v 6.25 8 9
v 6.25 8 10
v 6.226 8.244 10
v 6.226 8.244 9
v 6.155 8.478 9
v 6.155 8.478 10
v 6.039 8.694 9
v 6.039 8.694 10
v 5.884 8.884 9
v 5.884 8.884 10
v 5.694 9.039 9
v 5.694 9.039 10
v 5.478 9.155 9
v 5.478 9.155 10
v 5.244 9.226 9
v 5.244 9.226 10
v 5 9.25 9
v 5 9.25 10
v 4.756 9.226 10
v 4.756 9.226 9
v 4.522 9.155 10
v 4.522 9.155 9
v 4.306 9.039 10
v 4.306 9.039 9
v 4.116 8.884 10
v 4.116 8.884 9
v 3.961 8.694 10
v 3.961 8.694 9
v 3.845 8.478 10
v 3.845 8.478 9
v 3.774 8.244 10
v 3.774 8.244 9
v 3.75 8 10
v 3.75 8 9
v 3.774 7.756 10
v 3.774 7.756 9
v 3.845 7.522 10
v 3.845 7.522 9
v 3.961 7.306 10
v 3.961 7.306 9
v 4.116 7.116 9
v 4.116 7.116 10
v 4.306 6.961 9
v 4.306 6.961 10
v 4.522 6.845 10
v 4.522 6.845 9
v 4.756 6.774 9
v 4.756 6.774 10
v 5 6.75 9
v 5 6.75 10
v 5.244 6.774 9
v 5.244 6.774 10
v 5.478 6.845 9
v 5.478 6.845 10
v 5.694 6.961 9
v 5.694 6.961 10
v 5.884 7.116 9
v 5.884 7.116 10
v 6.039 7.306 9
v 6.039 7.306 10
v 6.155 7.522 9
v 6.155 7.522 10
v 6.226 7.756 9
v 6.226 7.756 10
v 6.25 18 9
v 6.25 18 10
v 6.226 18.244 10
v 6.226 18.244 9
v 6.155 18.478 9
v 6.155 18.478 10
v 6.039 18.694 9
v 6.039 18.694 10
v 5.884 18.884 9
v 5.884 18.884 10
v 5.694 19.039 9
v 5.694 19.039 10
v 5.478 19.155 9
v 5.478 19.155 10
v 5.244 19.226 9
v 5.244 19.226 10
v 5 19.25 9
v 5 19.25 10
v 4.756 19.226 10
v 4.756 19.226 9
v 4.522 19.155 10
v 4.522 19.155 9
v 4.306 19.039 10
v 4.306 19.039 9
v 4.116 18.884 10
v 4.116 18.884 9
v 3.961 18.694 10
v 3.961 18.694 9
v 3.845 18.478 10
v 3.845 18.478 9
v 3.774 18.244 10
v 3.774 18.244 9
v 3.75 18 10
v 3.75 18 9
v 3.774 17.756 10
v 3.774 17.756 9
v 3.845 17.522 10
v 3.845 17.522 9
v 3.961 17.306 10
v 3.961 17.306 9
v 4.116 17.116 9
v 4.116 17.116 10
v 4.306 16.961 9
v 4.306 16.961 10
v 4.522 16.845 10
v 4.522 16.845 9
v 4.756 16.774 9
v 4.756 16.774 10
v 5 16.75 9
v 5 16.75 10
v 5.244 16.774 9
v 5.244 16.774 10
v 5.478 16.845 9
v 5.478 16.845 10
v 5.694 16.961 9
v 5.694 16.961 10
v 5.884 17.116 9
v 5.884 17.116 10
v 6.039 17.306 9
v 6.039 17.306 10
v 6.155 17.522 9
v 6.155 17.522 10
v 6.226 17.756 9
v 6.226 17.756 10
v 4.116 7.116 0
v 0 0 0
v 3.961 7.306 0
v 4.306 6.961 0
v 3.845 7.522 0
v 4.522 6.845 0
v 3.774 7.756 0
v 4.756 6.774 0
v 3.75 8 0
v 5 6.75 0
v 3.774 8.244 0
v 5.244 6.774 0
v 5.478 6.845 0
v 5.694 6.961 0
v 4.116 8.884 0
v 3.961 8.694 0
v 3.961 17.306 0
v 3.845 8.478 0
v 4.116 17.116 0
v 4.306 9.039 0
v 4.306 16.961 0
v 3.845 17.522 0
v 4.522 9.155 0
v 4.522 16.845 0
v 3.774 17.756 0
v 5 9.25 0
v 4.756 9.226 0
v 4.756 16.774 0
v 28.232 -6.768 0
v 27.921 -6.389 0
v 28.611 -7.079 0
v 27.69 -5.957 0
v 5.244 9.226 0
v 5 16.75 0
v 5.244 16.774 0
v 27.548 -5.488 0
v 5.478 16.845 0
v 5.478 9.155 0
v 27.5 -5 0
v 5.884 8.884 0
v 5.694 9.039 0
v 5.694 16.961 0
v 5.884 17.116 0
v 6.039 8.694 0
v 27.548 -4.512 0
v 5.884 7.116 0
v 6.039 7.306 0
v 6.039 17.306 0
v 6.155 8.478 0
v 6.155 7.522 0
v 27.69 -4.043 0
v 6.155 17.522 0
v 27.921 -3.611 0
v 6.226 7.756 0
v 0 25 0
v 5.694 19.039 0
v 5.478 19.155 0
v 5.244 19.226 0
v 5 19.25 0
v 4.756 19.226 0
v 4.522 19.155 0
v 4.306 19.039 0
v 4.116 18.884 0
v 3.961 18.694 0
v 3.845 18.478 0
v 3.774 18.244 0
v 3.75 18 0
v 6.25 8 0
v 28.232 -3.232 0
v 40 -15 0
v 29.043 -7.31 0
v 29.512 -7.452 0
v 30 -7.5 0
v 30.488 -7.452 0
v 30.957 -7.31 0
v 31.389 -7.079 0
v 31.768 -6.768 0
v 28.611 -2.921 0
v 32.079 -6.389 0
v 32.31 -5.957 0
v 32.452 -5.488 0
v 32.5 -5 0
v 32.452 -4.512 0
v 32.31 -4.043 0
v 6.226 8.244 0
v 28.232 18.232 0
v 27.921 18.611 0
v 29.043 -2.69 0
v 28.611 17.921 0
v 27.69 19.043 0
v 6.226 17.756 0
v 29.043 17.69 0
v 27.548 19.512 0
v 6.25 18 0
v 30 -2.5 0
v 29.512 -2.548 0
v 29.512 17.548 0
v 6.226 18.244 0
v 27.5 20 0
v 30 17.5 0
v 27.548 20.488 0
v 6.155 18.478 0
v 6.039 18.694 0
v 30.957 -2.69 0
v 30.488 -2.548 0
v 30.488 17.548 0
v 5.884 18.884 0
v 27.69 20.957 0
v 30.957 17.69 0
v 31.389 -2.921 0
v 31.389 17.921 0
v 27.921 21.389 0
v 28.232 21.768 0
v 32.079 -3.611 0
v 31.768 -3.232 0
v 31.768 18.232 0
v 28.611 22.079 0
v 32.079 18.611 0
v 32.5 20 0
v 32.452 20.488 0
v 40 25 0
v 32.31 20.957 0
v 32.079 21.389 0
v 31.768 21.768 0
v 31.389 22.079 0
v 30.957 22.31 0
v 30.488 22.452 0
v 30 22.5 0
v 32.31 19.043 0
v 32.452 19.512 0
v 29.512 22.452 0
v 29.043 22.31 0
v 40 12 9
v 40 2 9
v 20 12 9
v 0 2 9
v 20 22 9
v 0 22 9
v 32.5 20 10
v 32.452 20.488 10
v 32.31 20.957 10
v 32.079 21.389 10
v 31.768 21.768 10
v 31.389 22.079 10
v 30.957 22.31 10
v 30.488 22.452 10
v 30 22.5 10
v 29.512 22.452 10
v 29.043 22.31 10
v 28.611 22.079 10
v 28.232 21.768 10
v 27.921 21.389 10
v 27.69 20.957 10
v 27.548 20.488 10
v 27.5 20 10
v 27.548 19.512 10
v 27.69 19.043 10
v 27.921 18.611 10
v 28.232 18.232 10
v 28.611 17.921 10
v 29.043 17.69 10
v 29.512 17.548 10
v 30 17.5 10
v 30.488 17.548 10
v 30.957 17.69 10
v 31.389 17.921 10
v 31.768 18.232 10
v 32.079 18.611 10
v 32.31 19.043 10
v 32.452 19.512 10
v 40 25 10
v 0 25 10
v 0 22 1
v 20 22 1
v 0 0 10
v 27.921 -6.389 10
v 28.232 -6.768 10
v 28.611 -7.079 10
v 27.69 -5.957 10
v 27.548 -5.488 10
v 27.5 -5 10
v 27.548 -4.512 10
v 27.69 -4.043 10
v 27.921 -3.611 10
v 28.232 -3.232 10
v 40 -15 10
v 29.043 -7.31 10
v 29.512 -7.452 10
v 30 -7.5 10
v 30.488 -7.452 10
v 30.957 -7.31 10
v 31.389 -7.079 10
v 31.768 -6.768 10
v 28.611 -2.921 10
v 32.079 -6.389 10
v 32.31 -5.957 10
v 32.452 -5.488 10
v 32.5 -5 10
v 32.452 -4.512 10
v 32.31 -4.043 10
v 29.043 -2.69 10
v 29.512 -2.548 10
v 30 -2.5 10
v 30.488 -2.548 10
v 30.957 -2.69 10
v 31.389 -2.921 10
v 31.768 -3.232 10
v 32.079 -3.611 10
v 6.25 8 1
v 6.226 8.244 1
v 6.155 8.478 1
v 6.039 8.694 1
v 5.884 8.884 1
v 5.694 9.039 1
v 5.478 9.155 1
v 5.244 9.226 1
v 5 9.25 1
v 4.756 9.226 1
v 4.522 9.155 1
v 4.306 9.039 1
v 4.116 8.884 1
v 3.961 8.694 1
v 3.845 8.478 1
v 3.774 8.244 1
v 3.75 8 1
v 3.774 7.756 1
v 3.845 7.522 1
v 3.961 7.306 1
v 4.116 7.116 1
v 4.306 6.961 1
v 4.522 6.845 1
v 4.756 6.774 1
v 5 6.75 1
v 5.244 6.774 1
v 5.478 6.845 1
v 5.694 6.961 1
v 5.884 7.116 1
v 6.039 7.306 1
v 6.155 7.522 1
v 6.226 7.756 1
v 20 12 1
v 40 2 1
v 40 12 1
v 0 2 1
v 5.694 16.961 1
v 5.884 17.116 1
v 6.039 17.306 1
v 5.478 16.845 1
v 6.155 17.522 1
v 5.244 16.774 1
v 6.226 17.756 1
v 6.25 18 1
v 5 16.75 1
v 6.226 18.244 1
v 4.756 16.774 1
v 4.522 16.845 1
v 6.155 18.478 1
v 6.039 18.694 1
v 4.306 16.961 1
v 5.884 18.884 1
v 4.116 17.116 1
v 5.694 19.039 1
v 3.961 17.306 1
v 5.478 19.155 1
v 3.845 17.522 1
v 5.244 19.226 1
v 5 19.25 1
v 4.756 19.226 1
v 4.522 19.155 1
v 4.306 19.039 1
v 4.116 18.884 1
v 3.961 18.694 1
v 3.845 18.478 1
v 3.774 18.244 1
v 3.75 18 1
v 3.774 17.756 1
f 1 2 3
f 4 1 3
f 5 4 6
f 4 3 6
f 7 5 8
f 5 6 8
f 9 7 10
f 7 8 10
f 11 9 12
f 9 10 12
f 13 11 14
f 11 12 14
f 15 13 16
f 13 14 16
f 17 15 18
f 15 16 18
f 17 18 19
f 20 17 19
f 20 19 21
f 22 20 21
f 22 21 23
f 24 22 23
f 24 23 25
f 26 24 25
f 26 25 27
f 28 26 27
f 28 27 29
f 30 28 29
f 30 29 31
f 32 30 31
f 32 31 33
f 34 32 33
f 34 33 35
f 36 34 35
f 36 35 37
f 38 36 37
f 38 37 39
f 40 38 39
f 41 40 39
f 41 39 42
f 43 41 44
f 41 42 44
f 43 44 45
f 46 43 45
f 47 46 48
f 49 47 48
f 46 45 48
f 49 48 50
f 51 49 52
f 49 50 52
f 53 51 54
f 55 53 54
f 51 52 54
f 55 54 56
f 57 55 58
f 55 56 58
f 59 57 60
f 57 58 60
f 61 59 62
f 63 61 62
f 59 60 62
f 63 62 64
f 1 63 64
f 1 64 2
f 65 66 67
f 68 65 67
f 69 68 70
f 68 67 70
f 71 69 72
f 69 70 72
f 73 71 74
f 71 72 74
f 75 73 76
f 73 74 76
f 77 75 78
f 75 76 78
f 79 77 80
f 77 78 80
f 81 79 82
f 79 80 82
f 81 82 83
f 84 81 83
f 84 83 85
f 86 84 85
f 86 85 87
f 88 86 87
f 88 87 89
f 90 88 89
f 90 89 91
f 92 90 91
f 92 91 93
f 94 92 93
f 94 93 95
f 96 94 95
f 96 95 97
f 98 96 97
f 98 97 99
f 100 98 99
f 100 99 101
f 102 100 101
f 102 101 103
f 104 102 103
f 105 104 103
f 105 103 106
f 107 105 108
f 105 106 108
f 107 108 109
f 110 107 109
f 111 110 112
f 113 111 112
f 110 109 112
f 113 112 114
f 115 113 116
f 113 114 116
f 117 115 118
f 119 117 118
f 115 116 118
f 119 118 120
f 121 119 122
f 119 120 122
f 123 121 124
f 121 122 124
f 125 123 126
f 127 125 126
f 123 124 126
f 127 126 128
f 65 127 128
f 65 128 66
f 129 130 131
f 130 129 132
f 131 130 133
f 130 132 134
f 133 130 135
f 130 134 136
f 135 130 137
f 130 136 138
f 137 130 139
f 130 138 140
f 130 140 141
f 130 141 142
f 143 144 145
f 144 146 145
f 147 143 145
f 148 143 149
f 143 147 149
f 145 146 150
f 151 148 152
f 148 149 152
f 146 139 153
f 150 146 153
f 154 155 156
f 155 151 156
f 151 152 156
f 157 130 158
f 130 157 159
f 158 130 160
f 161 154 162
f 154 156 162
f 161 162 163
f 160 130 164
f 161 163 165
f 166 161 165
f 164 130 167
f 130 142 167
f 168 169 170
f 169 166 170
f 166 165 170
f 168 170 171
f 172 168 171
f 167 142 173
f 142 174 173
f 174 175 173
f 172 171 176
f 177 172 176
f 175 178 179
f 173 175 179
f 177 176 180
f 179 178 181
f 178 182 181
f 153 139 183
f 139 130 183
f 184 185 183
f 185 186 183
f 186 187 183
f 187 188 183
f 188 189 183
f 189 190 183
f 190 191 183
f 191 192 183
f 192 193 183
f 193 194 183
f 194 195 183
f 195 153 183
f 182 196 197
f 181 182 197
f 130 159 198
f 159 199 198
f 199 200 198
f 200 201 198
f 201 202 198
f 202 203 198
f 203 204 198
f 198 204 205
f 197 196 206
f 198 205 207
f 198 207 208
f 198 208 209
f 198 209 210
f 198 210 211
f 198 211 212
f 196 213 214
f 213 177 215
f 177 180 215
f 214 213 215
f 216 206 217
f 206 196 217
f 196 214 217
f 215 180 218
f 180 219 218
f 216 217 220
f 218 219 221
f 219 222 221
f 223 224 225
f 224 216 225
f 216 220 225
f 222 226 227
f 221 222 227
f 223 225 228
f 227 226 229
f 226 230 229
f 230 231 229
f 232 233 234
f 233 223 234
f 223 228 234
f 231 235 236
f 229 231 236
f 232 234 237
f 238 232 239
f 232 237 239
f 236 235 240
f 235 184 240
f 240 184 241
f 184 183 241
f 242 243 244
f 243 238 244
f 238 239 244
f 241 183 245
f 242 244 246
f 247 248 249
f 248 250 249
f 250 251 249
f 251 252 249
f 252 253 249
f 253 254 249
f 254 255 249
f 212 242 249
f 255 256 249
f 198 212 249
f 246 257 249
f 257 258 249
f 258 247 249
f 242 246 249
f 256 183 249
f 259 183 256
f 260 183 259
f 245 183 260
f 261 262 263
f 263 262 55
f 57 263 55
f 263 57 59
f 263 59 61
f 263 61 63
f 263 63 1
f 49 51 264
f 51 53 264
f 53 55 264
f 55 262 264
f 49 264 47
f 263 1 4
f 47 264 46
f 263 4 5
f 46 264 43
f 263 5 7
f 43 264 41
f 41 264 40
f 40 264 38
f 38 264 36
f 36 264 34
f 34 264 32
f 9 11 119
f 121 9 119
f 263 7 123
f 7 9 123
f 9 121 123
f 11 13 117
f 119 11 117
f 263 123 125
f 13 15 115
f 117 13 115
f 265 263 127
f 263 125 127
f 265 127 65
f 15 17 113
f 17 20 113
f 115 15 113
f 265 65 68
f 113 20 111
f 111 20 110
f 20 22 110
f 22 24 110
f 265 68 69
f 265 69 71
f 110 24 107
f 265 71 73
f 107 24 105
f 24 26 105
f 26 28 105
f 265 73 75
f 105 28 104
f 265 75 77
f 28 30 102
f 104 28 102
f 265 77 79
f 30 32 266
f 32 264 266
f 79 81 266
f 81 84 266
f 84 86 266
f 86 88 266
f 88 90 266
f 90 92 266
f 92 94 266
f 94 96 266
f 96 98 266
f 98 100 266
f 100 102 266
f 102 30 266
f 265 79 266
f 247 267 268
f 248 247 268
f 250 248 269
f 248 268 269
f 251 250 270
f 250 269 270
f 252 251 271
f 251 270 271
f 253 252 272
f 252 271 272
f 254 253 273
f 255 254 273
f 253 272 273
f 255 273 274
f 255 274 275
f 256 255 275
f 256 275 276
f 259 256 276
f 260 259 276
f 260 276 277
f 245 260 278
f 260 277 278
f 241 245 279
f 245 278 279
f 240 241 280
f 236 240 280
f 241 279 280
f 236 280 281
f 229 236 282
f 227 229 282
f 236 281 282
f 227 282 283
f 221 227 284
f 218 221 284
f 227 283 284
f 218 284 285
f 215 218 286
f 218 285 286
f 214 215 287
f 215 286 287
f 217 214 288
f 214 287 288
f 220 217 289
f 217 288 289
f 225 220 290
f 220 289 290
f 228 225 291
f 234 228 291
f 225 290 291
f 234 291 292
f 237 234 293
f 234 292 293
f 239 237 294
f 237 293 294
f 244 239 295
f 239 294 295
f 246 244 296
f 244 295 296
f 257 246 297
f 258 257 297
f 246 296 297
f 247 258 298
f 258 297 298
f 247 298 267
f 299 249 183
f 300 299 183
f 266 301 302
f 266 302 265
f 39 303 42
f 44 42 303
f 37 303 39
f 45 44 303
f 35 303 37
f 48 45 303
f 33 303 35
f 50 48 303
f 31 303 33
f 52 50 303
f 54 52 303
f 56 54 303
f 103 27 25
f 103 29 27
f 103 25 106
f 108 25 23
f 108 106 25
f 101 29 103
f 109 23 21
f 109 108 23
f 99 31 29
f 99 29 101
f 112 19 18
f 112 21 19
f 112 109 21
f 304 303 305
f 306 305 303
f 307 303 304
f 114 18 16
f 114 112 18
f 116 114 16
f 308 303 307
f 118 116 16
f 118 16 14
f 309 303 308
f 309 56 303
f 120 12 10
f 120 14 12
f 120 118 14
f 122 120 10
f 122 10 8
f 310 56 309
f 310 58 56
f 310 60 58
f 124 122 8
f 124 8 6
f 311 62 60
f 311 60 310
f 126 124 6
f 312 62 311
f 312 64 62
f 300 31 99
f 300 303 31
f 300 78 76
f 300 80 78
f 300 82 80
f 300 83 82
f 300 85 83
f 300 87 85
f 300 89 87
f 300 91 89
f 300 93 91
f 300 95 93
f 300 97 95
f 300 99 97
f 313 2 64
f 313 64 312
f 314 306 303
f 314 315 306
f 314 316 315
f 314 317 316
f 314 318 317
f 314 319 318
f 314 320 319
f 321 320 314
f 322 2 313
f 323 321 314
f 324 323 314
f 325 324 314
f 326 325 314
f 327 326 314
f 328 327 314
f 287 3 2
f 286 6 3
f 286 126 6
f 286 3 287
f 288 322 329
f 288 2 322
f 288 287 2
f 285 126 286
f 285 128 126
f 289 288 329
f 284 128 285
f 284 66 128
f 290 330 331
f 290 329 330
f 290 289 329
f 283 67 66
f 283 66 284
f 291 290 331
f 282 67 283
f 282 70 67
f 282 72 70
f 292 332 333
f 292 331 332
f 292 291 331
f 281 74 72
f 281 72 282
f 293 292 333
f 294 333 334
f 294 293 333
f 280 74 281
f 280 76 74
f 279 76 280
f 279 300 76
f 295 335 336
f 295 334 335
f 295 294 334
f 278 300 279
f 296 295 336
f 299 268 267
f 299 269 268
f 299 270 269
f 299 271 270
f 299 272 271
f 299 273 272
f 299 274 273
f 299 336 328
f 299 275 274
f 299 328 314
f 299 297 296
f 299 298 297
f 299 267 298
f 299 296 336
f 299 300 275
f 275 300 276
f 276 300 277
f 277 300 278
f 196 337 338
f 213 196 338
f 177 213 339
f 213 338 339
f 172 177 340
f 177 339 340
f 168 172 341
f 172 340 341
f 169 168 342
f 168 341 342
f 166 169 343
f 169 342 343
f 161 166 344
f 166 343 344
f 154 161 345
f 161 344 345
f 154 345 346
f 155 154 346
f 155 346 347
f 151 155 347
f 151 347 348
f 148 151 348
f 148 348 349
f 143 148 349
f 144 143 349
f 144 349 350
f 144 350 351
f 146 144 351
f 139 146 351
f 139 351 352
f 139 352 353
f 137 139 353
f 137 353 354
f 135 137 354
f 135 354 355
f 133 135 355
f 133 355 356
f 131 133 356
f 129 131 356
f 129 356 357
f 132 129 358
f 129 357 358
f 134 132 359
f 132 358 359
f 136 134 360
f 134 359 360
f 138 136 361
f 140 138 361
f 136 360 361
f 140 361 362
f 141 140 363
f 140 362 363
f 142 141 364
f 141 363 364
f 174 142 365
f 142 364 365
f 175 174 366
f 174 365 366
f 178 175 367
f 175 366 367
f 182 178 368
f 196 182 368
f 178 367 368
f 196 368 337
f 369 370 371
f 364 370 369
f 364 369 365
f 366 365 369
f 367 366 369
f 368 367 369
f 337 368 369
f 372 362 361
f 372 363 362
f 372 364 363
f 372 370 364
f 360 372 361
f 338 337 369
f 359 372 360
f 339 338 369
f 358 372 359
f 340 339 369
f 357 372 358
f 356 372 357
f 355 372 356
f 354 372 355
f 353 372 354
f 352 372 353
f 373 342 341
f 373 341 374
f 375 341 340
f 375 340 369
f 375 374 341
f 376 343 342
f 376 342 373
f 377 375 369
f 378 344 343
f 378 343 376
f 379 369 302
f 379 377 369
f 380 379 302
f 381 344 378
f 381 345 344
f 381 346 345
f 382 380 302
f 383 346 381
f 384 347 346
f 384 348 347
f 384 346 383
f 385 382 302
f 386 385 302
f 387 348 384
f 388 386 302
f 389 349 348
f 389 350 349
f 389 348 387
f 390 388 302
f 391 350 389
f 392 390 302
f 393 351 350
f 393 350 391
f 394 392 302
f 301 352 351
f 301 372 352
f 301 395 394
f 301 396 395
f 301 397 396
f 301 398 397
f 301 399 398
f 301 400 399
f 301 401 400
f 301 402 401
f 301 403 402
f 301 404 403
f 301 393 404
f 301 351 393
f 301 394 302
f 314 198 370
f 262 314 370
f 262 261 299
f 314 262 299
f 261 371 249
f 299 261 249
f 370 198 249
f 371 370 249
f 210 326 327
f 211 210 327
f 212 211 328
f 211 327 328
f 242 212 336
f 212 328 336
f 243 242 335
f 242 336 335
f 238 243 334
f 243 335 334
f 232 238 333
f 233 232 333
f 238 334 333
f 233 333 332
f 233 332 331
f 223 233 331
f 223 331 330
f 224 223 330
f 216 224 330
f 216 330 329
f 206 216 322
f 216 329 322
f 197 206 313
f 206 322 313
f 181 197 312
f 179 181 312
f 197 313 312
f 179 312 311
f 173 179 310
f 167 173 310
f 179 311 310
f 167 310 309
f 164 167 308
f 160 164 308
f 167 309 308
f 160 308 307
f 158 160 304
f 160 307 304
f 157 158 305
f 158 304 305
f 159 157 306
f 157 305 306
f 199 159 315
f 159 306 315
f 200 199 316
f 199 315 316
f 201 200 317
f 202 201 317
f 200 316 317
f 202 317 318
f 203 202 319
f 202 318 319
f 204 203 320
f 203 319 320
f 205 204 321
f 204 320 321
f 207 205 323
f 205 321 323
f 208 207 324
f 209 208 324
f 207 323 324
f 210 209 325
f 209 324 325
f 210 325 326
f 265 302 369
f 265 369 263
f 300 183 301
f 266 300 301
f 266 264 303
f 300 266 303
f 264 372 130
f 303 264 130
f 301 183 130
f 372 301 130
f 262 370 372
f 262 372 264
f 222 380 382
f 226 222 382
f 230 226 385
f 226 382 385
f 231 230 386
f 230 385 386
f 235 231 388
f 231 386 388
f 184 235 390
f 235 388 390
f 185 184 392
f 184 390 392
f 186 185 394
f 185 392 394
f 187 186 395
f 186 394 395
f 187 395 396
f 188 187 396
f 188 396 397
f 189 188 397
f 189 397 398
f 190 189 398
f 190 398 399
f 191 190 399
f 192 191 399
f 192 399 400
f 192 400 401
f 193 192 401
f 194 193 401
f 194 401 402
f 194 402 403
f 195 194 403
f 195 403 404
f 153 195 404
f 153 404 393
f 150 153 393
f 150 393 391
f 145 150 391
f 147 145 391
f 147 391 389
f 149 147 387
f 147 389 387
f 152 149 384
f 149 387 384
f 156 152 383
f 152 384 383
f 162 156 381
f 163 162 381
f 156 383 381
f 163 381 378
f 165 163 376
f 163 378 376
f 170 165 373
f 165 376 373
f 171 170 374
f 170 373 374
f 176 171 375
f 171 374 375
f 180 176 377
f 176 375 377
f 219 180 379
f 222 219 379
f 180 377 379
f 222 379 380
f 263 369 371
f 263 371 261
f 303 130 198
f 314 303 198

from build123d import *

# Parameters (mm, degrees)
BOSS_EXTRUDE1_DEPTH = 10
SKETCH2_W           = 8
SKETCH2_H           = 20
CUT_EXTRUDE1_DEPTH  = 20
SKETCH3_W           = 8
SKETCH3_H           = 10
CUT_EXTRUDE2_DEPTH  = 34.541019662
SKETCH4_R           = 1.25
SKETCH4_R_2         = 2.5
CUT_EXTRUDE3_DEPTH  = 10


with BuildPart() as part:
    # Sketch1 → Boss-Extrude1 (new body)
    with BuildSketch(Plane.XY):
        Polygon((0, 0), (40, -15), (40, 25), (0, 25), align=None)
    extrude(amount=BOSS_EXTRUDE1_DEPTH)

    # Sketch2 → Cut-Extrude1 (cut)
    with BuildSketch(Plane.ZY):
        with Locations((5, 12)):
            Rectangle(SKETCH2_W, SKETCH2_H)
    extrude(amount=-CUT_EXTRUDE1_DEPTH, mode=Mode.SUBTRACT)

    # Sketch3 → Cut-Extrude2 (cut, through all)
    with BuildSketch(Plane.ZY.offset(-20)):
        with Locations((5, 7)):
            Rectangle(SKETCH3_W, SKETCH3_H)
    extrude(amount=-CUT_EXTRUDE2_DEPTH, mode=Mode.SUBTRACT)

    # Sketch4 → Cut-Extrude3 (cut)
    with BuildSketch(Plane.XY.offset(10)):
        with Locations((5, 18)):
            Circle(SKETCH4_R)
        with Locations((5, 8)):
            Circle(SKETCH4_R)
        with Locations((30, 20)):
            Circle(SKETCH4_R_2)
        with Locations((30, -5)):
            Circle(SKETCH4_R_2)
    extrude(amount=-CUT_EXTRUDE3_DEPTH, mode=Mode.SUBTRACT)


solid = part.part
